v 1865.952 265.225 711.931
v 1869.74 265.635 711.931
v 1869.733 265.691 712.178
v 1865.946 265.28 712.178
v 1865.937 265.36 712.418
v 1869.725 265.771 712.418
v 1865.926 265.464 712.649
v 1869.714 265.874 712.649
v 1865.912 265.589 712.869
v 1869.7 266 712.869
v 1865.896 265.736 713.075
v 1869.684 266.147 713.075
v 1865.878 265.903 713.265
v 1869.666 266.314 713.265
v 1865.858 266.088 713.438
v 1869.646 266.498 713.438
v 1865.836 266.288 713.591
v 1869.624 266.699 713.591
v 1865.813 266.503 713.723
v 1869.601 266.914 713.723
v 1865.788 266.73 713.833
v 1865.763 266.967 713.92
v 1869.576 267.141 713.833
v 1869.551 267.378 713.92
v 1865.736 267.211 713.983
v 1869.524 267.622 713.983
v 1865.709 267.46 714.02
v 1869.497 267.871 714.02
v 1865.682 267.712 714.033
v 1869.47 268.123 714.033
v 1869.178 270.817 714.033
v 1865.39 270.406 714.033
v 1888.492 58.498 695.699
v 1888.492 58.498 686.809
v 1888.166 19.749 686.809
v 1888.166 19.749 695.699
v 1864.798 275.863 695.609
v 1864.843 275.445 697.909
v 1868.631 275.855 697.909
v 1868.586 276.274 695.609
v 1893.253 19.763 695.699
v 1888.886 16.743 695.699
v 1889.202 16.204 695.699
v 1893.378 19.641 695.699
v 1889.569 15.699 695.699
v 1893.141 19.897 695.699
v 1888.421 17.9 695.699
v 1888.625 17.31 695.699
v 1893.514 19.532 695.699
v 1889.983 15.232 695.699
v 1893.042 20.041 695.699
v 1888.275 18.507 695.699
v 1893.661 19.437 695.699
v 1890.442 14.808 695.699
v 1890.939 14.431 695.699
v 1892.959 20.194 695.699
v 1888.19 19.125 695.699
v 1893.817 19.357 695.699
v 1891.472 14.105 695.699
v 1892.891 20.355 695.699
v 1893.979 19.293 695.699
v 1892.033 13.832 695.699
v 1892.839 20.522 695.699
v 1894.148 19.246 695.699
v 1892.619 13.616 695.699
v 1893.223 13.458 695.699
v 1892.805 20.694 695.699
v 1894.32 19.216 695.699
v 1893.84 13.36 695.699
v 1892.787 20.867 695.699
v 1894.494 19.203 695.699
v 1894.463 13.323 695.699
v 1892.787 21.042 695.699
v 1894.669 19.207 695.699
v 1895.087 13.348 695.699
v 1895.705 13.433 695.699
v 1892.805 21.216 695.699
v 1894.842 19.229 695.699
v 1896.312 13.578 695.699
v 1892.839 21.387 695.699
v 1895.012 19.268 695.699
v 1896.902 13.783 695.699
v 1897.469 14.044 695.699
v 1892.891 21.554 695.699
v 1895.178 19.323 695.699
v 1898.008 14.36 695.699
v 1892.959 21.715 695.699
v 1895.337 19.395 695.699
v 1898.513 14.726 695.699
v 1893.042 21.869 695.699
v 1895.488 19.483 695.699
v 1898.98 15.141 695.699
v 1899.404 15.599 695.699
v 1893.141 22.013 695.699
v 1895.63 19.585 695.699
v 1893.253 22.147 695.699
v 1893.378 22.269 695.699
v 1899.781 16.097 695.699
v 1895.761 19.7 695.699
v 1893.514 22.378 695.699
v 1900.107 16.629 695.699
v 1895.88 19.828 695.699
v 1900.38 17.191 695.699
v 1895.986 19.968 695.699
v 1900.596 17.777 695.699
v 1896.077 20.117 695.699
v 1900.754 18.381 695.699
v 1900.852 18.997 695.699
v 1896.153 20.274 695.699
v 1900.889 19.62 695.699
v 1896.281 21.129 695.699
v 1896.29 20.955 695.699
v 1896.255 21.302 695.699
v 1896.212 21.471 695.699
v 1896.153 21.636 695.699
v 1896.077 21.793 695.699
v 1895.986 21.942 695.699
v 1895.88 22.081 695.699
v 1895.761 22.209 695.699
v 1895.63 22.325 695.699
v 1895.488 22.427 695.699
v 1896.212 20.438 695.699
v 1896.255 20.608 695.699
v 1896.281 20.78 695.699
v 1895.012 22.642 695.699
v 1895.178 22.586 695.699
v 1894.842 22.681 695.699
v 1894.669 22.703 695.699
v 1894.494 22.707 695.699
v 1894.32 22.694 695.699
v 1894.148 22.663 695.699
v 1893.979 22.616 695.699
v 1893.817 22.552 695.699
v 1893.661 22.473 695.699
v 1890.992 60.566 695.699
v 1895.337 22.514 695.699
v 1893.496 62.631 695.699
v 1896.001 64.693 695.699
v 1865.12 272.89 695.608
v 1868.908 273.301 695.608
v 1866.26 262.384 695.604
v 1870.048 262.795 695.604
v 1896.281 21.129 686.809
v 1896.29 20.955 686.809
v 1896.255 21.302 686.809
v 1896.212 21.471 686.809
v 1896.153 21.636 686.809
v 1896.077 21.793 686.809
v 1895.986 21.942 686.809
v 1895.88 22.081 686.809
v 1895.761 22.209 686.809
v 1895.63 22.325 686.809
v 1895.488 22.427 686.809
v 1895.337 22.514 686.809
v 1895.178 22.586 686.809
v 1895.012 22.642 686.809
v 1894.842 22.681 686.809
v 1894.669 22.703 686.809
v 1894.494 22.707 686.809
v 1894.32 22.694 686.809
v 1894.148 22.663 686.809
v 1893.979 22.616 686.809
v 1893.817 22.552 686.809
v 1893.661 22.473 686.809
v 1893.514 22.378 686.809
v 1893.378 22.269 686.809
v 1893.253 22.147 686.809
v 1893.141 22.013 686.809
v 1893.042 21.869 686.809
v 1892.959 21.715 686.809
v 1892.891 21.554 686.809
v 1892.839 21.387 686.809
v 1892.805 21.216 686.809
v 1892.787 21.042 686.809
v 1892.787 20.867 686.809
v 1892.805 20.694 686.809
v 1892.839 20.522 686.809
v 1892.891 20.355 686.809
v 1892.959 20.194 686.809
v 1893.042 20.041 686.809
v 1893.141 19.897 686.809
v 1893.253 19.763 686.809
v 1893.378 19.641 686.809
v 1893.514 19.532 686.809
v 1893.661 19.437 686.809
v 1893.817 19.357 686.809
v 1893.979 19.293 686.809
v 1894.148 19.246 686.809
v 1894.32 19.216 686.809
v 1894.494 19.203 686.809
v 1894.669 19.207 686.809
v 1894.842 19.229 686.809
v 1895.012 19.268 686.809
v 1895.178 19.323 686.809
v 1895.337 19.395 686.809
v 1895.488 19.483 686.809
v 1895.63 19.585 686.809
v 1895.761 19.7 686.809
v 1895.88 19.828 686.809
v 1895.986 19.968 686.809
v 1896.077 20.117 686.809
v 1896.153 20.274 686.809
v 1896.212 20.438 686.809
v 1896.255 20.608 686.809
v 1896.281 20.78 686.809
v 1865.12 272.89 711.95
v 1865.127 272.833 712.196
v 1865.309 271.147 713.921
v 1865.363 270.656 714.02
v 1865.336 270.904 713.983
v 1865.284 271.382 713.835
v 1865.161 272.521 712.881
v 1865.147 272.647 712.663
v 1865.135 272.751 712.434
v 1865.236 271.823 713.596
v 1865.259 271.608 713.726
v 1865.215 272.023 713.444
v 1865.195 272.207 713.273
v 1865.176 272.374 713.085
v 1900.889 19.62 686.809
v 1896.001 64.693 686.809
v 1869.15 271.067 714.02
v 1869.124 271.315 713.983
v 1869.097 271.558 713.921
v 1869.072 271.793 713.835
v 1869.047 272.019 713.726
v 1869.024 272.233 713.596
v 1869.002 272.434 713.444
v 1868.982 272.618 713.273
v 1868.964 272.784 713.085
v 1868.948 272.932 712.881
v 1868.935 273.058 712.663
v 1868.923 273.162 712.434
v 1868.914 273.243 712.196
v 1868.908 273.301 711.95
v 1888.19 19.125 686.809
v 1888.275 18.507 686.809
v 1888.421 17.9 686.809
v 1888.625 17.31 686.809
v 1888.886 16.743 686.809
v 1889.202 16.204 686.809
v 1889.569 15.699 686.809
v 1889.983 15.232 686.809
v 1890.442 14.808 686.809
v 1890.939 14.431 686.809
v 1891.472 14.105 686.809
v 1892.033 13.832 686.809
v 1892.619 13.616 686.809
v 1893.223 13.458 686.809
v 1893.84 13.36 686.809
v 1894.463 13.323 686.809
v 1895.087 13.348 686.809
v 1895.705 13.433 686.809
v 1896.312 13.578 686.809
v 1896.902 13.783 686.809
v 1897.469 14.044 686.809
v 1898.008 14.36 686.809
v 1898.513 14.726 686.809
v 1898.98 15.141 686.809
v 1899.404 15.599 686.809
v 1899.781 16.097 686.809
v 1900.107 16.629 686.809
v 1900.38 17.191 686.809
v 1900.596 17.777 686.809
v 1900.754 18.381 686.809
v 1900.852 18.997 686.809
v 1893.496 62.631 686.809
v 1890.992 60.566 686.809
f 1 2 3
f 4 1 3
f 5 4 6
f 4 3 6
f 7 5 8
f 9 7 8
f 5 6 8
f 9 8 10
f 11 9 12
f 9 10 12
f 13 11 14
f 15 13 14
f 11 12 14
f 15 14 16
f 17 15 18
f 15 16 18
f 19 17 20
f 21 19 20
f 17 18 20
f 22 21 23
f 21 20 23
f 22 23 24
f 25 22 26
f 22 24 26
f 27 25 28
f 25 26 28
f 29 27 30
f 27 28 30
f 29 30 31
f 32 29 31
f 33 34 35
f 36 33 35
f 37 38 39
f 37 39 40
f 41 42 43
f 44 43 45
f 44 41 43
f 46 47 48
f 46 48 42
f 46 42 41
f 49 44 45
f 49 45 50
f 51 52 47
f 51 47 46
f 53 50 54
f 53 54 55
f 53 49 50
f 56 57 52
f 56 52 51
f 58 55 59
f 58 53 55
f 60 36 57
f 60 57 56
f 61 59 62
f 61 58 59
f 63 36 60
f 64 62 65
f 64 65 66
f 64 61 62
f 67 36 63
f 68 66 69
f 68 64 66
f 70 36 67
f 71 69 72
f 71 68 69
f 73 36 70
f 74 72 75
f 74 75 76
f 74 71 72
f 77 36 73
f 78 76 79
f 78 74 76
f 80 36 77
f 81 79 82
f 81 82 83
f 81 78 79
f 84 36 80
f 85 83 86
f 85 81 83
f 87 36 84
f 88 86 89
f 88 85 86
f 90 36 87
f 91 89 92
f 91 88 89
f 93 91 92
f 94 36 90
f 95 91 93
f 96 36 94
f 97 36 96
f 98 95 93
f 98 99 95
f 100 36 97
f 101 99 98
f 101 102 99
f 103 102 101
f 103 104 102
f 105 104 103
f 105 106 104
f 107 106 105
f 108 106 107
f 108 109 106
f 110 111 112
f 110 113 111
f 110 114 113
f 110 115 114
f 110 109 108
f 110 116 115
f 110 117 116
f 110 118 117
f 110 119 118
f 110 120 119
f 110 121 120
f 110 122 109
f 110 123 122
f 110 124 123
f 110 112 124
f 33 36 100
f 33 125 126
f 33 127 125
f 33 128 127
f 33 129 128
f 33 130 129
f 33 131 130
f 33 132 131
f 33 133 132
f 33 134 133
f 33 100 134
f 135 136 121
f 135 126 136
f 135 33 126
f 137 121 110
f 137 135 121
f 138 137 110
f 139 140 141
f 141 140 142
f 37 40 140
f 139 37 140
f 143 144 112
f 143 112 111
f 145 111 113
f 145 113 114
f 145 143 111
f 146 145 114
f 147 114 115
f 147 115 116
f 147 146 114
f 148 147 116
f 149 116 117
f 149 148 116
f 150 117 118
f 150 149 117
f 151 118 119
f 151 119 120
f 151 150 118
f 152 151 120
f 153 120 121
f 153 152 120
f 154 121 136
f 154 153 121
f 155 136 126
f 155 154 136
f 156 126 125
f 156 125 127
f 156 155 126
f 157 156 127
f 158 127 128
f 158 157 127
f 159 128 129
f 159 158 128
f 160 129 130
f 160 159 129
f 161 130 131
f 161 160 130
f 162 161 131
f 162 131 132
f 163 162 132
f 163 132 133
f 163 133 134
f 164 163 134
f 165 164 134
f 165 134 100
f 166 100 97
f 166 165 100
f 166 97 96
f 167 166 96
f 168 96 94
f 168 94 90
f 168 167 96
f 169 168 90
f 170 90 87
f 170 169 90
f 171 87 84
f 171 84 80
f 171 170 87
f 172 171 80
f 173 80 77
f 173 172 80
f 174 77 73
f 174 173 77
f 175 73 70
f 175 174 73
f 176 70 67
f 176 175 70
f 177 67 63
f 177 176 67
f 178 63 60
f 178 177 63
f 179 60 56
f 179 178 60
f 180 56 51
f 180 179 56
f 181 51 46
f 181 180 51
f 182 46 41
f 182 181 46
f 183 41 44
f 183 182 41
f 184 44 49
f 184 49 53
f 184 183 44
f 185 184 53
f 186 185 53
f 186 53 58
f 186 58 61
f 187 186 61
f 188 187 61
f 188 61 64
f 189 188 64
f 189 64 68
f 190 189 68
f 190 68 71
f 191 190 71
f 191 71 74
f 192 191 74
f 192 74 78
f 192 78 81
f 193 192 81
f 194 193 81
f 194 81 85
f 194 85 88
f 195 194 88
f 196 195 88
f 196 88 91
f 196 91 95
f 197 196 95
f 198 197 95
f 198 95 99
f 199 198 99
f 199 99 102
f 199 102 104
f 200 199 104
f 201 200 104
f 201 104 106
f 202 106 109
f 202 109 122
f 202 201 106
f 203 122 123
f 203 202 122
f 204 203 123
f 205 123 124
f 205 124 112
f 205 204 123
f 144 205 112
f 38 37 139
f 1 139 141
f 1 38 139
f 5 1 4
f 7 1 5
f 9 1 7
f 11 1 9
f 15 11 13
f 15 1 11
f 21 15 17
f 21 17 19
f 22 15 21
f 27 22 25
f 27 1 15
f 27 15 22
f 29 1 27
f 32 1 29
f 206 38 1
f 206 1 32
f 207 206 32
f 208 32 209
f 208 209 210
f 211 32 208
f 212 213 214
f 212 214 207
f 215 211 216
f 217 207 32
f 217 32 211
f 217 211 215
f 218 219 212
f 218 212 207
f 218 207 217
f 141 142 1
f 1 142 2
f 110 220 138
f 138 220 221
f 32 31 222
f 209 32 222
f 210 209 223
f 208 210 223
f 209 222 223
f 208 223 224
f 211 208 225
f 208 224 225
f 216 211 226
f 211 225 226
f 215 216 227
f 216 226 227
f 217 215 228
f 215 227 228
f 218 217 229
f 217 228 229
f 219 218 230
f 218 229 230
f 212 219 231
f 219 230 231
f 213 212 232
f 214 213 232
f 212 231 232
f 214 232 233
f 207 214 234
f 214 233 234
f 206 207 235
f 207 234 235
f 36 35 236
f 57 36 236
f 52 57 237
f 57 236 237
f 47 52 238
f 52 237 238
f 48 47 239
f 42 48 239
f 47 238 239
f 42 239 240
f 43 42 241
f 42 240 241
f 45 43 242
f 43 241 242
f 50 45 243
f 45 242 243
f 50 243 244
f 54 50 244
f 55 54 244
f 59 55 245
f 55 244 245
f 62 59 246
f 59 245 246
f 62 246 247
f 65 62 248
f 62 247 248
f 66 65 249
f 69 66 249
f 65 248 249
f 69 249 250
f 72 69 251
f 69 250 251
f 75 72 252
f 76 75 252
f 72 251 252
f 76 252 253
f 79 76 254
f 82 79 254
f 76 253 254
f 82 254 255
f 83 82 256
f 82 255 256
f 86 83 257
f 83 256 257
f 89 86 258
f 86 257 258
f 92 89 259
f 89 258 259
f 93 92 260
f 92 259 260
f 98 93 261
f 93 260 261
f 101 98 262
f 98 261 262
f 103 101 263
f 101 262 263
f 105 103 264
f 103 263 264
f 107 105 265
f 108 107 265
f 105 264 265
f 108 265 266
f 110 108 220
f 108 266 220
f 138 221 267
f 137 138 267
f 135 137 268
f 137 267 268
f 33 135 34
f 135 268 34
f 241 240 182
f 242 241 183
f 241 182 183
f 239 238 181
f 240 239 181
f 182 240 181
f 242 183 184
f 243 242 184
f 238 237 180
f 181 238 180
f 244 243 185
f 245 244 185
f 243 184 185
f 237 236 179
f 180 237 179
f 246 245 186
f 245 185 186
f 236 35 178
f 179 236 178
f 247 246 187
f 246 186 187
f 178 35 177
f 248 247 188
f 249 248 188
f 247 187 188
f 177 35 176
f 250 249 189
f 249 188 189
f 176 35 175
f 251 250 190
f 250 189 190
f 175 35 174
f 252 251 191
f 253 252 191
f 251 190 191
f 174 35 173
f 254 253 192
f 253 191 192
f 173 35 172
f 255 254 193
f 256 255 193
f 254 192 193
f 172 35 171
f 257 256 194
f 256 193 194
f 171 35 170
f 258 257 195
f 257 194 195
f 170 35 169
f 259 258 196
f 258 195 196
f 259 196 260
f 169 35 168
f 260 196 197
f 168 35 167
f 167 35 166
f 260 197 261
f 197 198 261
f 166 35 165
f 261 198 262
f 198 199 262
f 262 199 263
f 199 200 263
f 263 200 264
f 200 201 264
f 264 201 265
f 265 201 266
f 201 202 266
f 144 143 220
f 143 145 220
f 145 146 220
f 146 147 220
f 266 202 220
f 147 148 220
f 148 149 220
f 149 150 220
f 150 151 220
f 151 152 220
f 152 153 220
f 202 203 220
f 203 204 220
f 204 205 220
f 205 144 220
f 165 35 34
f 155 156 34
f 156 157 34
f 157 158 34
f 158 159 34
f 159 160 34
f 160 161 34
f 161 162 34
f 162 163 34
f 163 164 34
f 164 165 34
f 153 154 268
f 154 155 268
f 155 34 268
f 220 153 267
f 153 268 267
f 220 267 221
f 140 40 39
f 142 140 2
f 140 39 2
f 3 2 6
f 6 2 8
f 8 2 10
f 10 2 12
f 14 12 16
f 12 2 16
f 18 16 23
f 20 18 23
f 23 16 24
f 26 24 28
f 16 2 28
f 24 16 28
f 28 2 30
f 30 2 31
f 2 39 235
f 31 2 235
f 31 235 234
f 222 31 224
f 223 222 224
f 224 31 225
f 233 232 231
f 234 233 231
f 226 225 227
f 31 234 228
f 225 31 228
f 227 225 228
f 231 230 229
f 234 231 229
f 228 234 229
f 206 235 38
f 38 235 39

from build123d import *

# Parameters (mm, degrees)
SKETCH1_R                = 1.7526
BOSS_EXTRUDE1_DEPTH      = 8.89
BOSS_EXTRUDE2_DEPTH      = 1.905
BOSS_EXTRUDE2_DEPTH_BACK = 1.905
BOSS_EXTRUDE2_START      = 6.35


with BuildPart() as part:
    # Sketch1 → Boss-Extrude1 (new body)
    with BuildSketch(Plane.XY.offset(686.809186753)):
        with BuildLine():
            Line((1900.888851589, 19.620446581), (1896.001061366, 64.693409066))
            ThreePointArc((1896.001061366, 64.693409066), (1892.243741214, 61.598932687), (1888.49175705, 58.497988698))
            Line((1888.49175705, 58.497988698), (1888.165665709, 19.749246166))
            ThreePointArc((1888.165665709, 19.749246166), (1894.462858856, 13.323253433), (1900.888851589, 19.620446581))
        make_face()
        with Locations((1894.537558365, 20.954804607)):
            Circle(SKETCH1_R, mode=Mode.SUBTRACT)
    extrude(amount=BOSS_EXTRUDE1_DEPTH)


with BuildPart() as body_2:
    # Sketch2 → Boss-Extrude2 (new, two sides: drawn at the far end of the back side and taken through both)
    with BuildSketch(Plane(origin=(1880.901419931, 203.935385675, 0), x_dir=(0, 0, 1), z_dir=(-0.9941715502675706, -0.10780968712771334, 0)).offset(BOSS_EXTRUDE2_START - BOSS_EXTRUDE2_DEPTH_BACK)):
        with BuildLine():
            Line((697.909018497, 72.823574899), (695.608660835, 73.244562676))
            Line((695.608660835, 73.244562676), (695.607635569, 70.25390024))
            Line((695.607635569, 70.25390024), (695.604012875, 59.686643231))
            Line((695.604012875, 59.686643231), (711.930786275, 62.543686297))
            ThreePointArc((711.930786275, 62.543686297), (713.437656121, 63.41172663), (714.032961387, 65.045667386))
            Line((714.032961387, 65.045667386), (714.032961387, 67.755396286))
            ThreePointArc((714.032961387, 67.755396286), (713.443988835, 69.381770136), (711.95021186, 70.25390024))
            Line((711.95021186, 70.25390024), (697.909018497, 72.823574899))
        make_face()
    extrude(amount=BOSS_EXTRUDE2_DEPTH + BOSS_EXTRUDE2_DEPTH_BACK)


solid = Compound([part.part, body_2.part])
